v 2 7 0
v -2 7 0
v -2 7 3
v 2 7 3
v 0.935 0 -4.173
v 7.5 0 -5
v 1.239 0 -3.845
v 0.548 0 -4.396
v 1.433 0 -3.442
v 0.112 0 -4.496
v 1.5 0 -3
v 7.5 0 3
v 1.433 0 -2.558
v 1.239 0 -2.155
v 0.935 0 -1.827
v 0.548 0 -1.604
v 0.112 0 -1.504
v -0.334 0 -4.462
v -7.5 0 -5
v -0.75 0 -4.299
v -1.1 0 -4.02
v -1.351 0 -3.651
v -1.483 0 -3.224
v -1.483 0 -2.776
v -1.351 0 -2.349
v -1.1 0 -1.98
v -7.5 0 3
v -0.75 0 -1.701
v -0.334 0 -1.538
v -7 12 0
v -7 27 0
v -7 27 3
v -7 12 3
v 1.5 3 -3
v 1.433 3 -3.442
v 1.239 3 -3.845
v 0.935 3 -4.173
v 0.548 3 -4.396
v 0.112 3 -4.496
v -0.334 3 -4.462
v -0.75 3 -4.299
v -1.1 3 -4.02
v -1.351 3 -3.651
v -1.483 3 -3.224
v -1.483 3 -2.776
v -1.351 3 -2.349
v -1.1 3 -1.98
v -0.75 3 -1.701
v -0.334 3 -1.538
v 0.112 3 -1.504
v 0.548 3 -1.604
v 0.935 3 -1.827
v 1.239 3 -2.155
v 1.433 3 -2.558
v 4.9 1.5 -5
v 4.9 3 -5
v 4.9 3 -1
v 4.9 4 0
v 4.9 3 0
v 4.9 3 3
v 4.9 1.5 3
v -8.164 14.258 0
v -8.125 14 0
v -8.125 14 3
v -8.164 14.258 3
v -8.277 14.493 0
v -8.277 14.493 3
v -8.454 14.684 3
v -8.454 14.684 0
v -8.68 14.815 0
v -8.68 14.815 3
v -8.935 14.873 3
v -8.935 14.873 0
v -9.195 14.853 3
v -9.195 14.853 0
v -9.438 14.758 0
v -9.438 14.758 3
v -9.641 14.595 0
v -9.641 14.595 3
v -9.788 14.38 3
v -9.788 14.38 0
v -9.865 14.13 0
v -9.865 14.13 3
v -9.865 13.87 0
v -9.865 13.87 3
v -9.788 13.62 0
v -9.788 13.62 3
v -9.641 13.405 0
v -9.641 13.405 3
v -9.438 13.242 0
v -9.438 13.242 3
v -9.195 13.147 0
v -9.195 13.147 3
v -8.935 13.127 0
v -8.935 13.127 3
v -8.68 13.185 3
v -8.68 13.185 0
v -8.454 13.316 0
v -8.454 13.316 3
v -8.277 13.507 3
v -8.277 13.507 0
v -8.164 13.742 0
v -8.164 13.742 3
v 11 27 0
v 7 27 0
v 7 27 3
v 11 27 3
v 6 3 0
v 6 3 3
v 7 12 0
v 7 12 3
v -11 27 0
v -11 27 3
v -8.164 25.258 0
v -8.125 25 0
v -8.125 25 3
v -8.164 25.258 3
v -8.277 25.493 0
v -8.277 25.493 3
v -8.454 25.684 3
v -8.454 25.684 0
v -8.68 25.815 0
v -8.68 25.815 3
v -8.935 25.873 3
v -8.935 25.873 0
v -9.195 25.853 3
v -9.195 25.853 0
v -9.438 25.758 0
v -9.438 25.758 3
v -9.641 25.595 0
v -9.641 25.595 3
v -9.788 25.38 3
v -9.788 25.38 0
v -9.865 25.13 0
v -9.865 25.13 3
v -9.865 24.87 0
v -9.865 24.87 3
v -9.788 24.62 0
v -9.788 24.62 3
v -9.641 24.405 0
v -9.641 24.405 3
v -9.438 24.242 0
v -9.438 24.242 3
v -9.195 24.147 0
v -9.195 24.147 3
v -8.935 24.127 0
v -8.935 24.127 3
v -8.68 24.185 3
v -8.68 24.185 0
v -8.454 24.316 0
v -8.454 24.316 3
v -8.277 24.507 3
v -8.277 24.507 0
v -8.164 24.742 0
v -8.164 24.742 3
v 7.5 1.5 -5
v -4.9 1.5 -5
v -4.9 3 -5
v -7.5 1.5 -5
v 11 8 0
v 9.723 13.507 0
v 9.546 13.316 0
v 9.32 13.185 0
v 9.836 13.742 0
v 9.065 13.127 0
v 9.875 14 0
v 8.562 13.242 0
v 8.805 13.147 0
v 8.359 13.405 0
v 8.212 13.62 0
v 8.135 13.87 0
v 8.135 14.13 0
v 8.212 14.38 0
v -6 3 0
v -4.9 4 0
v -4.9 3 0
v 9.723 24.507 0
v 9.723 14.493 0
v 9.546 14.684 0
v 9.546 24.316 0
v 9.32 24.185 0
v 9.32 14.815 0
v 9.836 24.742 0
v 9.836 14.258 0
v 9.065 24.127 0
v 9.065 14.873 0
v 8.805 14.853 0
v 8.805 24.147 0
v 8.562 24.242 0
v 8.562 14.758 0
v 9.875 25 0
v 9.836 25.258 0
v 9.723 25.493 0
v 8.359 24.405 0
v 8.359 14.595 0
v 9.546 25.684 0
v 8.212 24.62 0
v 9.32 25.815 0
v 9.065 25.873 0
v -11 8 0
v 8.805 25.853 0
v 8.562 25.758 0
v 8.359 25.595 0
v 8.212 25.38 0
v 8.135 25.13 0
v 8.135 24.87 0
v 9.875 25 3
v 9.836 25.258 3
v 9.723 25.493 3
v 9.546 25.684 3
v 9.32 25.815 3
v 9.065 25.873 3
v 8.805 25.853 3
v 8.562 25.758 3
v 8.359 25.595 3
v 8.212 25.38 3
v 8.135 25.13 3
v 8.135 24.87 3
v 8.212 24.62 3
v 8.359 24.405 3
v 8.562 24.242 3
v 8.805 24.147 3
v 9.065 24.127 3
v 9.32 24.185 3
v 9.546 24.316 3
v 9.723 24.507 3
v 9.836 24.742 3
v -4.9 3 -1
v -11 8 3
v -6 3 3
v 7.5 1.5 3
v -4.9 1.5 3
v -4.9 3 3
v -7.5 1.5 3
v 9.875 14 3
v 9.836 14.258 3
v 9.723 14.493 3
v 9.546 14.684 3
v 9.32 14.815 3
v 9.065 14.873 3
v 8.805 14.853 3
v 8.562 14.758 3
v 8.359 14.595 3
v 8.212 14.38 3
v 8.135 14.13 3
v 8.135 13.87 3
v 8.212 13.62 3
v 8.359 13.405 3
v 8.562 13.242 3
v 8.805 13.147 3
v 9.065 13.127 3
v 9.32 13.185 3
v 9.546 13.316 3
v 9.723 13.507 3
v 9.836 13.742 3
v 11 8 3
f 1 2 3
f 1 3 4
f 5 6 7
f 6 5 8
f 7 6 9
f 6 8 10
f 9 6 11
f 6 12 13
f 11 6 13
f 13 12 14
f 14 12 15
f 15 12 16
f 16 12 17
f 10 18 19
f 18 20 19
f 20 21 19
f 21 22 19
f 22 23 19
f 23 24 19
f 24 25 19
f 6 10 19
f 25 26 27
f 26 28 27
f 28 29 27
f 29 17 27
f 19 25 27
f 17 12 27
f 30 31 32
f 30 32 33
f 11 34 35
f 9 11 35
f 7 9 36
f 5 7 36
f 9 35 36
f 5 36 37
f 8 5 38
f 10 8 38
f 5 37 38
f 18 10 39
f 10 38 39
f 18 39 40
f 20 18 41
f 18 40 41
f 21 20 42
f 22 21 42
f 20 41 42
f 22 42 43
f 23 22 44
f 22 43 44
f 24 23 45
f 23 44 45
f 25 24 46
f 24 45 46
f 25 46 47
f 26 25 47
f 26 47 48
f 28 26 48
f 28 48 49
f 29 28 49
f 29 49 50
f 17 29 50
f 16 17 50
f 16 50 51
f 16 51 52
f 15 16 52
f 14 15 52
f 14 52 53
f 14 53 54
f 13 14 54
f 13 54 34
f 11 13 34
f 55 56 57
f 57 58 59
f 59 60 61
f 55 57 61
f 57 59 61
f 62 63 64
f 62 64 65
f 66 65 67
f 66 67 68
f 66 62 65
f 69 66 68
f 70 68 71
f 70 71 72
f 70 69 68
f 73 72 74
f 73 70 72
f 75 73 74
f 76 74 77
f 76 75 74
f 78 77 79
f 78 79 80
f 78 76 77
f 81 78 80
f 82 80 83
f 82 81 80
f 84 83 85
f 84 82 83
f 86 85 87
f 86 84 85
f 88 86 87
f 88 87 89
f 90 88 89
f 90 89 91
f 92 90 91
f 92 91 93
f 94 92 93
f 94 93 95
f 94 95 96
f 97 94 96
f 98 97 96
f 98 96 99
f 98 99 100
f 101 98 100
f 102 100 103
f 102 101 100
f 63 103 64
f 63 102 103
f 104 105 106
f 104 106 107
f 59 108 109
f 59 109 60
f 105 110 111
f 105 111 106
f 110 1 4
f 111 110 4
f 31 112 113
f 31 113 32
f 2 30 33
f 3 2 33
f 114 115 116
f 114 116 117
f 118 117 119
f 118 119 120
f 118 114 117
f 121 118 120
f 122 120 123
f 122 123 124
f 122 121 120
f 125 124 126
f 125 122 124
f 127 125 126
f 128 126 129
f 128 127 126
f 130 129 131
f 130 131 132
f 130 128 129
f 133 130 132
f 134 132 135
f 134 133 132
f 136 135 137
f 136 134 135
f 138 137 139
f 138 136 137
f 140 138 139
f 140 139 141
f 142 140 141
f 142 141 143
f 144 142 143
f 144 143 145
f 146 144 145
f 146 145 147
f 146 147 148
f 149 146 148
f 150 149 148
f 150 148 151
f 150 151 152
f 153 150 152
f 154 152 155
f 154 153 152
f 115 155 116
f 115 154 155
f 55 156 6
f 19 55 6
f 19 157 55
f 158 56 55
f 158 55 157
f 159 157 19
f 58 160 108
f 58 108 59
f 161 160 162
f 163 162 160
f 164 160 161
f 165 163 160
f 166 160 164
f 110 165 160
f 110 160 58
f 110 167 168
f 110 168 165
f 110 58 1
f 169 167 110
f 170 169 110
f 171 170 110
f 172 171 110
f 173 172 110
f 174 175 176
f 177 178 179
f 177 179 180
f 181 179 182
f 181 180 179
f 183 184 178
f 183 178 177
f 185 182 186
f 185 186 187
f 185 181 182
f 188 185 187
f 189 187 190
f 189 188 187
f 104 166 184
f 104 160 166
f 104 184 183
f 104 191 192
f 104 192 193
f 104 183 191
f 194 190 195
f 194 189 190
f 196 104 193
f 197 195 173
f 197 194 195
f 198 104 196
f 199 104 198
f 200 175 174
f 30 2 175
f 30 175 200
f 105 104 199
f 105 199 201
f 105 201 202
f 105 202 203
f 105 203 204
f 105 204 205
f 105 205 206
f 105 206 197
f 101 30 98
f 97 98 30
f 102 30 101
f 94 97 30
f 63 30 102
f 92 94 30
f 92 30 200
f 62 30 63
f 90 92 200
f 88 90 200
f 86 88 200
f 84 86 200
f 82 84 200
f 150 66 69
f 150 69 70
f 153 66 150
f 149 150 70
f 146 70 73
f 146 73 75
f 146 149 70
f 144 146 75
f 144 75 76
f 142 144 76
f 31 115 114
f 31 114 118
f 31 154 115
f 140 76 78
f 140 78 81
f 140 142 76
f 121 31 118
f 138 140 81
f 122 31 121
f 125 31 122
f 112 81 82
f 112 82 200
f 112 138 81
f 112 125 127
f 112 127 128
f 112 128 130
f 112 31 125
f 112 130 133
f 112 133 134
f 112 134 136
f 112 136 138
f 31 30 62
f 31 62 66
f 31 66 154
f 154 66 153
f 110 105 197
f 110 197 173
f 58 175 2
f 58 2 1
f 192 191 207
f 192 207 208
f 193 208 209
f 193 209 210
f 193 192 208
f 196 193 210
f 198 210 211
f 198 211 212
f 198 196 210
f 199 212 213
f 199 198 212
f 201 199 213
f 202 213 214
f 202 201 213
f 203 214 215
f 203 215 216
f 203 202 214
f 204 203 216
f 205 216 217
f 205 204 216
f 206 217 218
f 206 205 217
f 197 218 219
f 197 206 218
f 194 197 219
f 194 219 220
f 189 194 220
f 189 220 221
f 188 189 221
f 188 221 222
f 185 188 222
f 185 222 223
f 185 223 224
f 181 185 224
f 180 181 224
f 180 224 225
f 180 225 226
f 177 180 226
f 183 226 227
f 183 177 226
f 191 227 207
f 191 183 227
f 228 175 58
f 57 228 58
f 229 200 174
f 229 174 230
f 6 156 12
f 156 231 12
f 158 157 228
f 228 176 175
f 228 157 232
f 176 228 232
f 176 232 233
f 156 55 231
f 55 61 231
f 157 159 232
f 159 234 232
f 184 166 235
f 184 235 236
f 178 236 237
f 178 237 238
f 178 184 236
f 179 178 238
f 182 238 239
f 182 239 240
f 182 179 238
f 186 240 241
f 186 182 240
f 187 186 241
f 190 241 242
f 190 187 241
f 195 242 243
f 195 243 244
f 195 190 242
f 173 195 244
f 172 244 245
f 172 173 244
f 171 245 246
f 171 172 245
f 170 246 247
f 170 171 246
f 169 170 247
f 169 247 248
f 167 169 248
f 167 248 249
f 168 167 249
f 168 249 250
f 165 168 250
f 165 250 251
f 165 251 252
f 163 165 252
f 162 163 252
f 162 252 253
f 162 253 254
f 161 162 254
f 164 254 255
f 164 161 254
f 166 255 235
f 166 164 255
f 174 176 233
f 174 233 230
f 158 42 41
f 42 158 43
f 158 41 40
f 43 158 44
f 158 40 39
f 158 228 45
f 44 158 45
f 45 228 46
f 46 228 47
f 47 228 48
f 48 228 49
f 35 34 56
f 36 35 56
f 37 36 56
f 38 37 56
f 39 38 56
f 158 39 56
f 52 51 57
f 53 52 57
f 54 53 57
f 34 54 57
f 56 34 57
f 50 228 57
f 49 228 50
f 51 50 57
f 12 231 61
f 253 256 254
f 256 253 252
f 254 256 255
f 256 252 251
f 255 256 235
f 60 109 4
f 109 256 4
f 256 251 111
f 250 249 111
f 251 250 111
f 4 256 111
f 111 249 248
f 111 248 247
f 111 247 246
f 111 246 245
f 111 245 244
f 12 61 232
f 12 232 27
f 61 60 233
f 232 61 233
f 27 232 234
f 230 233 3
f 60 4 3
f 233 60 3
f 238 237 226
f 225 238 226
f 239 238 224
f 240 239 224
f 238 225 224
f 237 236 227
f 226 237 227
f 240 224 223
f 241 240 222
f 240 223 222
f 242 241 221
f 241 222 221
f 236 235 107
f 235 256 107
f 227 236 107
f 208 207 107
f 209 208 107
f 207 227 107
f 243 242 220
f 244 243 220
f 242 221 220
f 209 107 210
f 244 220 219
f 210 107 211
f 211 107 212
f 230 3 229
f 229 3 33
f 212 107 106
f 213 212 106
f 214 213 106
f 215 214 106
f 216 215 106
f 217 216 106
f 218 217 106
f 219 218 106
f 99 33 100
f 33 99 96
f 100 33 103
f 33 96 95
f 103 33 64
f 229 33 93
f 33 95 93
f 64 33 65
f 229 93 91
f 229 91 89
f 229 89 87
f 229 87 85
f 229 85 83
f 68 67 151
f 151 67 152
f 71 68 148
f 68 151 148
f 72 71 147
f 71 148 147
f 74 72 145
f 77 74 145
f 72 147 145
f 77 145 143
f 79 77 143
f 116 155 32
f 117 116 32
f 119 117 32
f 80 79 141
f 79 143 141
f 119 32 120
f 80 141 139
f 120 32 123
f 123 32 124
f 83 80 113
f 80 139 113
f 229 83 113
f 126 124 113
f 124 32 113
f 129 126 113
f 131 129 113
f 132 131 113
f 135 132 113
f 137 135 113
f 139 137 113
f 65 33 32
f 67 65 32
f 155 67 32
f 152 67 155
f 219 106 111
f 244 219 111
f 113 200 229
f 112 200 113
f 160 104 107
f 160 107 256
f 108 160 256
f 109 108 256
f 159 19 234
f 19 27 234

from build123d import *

# Parameters (mm, degrees)
SKETCH1_R           = 0.875
BOSS_EXTRUDE1_DEPTH = 3
CHAMFER1_SIZE       = 5
BOSS_EXTRUDE2_DEPTH = 5
SKETCH2_R           = 1.5
CUT_EXTRUDE1_DEPTH  = 27.870057685
CHAMFER2_SIZE       = 1


with BuildPart() as part:
    # Sketch1 → Boss-Extrude1 (new body)
    with BuildSketch(Plane.XY):
        Polygon((-7.5, 1.5), (-7.5, 0), (7.5, 0), (7.5, 1.5), (4.9, 1.5), (4.9, 3), (11, 3), (11, 27), (7, 27), (7, 7), (-7, 7), (-7, 27), (-11, 27), (-11, 3), (-4.9, 3), (-4.9, 1.5), align=None)
        with Locations((9, 25)):
            Circle(SKETCH1_R, mode=Mode.SUBTRACT)
        with Locations((-9, 14)):
            Circle(SKETCH1_R, mode=Mode.SUBTRACT)
        with Locations((-9, 25)):
            Circle(SKETCH1_R, mode=Mode.SUBTRACT)
        with Locations((9, 14)):
            Circle(SKETCH1_R, mode=Mode.SUBTRACT)
    extrude(amount=BOSS_EXTRUDE1_DEPTH)

    # Chamfer1
    chamfer1_edges = [part.edges().sort_by_distance(p)[0] for p in [
        (7, 7, 1.5),
        (-7, 7, 1.5),
        (-11, 3, 1.5),
        (11, 3, 1.5),
    ]]
    chamfer(chamfer1_edges, length=CHAMFER1_SIZE)

    # Sketch1<4> → Boss-Extrude2 (add)
    with BuildSketch(Plane.XY):
        Polygon((-7.5, 1.5), (-7.5, 0), (7.5, 0), (7.5, 1.5), (4.9, 1.5), (4.9, 3), (-4.9, 3), (-4.9, 1.5), align=None)
    extrude(amount=-BOSS_EXTRUDE2_DEPTH)

    # Sketch2 → Cut-Extrude1 (cut, through all)
    with BuildSketch(Plane(origin=(0, 3, 0), x_dir=(1, 0, 0), z_dir=(0, 1, 0))):
        with Locations((0, 3)):
            Circle(SKETCH2_R)
    extrude(amount=-CUT_EXTRUDE1_DEPTH, mode=Mode.SUBTRACT)

    # Chamfer2
    chamfer2_edges = [part.edges().sort_by_distance(p)[0] for p in [
        (0, 3, 0),
    ]]
    chamfer(chamfer2_edges, length=CHAMFER2_SIZE)


solid = part.part
